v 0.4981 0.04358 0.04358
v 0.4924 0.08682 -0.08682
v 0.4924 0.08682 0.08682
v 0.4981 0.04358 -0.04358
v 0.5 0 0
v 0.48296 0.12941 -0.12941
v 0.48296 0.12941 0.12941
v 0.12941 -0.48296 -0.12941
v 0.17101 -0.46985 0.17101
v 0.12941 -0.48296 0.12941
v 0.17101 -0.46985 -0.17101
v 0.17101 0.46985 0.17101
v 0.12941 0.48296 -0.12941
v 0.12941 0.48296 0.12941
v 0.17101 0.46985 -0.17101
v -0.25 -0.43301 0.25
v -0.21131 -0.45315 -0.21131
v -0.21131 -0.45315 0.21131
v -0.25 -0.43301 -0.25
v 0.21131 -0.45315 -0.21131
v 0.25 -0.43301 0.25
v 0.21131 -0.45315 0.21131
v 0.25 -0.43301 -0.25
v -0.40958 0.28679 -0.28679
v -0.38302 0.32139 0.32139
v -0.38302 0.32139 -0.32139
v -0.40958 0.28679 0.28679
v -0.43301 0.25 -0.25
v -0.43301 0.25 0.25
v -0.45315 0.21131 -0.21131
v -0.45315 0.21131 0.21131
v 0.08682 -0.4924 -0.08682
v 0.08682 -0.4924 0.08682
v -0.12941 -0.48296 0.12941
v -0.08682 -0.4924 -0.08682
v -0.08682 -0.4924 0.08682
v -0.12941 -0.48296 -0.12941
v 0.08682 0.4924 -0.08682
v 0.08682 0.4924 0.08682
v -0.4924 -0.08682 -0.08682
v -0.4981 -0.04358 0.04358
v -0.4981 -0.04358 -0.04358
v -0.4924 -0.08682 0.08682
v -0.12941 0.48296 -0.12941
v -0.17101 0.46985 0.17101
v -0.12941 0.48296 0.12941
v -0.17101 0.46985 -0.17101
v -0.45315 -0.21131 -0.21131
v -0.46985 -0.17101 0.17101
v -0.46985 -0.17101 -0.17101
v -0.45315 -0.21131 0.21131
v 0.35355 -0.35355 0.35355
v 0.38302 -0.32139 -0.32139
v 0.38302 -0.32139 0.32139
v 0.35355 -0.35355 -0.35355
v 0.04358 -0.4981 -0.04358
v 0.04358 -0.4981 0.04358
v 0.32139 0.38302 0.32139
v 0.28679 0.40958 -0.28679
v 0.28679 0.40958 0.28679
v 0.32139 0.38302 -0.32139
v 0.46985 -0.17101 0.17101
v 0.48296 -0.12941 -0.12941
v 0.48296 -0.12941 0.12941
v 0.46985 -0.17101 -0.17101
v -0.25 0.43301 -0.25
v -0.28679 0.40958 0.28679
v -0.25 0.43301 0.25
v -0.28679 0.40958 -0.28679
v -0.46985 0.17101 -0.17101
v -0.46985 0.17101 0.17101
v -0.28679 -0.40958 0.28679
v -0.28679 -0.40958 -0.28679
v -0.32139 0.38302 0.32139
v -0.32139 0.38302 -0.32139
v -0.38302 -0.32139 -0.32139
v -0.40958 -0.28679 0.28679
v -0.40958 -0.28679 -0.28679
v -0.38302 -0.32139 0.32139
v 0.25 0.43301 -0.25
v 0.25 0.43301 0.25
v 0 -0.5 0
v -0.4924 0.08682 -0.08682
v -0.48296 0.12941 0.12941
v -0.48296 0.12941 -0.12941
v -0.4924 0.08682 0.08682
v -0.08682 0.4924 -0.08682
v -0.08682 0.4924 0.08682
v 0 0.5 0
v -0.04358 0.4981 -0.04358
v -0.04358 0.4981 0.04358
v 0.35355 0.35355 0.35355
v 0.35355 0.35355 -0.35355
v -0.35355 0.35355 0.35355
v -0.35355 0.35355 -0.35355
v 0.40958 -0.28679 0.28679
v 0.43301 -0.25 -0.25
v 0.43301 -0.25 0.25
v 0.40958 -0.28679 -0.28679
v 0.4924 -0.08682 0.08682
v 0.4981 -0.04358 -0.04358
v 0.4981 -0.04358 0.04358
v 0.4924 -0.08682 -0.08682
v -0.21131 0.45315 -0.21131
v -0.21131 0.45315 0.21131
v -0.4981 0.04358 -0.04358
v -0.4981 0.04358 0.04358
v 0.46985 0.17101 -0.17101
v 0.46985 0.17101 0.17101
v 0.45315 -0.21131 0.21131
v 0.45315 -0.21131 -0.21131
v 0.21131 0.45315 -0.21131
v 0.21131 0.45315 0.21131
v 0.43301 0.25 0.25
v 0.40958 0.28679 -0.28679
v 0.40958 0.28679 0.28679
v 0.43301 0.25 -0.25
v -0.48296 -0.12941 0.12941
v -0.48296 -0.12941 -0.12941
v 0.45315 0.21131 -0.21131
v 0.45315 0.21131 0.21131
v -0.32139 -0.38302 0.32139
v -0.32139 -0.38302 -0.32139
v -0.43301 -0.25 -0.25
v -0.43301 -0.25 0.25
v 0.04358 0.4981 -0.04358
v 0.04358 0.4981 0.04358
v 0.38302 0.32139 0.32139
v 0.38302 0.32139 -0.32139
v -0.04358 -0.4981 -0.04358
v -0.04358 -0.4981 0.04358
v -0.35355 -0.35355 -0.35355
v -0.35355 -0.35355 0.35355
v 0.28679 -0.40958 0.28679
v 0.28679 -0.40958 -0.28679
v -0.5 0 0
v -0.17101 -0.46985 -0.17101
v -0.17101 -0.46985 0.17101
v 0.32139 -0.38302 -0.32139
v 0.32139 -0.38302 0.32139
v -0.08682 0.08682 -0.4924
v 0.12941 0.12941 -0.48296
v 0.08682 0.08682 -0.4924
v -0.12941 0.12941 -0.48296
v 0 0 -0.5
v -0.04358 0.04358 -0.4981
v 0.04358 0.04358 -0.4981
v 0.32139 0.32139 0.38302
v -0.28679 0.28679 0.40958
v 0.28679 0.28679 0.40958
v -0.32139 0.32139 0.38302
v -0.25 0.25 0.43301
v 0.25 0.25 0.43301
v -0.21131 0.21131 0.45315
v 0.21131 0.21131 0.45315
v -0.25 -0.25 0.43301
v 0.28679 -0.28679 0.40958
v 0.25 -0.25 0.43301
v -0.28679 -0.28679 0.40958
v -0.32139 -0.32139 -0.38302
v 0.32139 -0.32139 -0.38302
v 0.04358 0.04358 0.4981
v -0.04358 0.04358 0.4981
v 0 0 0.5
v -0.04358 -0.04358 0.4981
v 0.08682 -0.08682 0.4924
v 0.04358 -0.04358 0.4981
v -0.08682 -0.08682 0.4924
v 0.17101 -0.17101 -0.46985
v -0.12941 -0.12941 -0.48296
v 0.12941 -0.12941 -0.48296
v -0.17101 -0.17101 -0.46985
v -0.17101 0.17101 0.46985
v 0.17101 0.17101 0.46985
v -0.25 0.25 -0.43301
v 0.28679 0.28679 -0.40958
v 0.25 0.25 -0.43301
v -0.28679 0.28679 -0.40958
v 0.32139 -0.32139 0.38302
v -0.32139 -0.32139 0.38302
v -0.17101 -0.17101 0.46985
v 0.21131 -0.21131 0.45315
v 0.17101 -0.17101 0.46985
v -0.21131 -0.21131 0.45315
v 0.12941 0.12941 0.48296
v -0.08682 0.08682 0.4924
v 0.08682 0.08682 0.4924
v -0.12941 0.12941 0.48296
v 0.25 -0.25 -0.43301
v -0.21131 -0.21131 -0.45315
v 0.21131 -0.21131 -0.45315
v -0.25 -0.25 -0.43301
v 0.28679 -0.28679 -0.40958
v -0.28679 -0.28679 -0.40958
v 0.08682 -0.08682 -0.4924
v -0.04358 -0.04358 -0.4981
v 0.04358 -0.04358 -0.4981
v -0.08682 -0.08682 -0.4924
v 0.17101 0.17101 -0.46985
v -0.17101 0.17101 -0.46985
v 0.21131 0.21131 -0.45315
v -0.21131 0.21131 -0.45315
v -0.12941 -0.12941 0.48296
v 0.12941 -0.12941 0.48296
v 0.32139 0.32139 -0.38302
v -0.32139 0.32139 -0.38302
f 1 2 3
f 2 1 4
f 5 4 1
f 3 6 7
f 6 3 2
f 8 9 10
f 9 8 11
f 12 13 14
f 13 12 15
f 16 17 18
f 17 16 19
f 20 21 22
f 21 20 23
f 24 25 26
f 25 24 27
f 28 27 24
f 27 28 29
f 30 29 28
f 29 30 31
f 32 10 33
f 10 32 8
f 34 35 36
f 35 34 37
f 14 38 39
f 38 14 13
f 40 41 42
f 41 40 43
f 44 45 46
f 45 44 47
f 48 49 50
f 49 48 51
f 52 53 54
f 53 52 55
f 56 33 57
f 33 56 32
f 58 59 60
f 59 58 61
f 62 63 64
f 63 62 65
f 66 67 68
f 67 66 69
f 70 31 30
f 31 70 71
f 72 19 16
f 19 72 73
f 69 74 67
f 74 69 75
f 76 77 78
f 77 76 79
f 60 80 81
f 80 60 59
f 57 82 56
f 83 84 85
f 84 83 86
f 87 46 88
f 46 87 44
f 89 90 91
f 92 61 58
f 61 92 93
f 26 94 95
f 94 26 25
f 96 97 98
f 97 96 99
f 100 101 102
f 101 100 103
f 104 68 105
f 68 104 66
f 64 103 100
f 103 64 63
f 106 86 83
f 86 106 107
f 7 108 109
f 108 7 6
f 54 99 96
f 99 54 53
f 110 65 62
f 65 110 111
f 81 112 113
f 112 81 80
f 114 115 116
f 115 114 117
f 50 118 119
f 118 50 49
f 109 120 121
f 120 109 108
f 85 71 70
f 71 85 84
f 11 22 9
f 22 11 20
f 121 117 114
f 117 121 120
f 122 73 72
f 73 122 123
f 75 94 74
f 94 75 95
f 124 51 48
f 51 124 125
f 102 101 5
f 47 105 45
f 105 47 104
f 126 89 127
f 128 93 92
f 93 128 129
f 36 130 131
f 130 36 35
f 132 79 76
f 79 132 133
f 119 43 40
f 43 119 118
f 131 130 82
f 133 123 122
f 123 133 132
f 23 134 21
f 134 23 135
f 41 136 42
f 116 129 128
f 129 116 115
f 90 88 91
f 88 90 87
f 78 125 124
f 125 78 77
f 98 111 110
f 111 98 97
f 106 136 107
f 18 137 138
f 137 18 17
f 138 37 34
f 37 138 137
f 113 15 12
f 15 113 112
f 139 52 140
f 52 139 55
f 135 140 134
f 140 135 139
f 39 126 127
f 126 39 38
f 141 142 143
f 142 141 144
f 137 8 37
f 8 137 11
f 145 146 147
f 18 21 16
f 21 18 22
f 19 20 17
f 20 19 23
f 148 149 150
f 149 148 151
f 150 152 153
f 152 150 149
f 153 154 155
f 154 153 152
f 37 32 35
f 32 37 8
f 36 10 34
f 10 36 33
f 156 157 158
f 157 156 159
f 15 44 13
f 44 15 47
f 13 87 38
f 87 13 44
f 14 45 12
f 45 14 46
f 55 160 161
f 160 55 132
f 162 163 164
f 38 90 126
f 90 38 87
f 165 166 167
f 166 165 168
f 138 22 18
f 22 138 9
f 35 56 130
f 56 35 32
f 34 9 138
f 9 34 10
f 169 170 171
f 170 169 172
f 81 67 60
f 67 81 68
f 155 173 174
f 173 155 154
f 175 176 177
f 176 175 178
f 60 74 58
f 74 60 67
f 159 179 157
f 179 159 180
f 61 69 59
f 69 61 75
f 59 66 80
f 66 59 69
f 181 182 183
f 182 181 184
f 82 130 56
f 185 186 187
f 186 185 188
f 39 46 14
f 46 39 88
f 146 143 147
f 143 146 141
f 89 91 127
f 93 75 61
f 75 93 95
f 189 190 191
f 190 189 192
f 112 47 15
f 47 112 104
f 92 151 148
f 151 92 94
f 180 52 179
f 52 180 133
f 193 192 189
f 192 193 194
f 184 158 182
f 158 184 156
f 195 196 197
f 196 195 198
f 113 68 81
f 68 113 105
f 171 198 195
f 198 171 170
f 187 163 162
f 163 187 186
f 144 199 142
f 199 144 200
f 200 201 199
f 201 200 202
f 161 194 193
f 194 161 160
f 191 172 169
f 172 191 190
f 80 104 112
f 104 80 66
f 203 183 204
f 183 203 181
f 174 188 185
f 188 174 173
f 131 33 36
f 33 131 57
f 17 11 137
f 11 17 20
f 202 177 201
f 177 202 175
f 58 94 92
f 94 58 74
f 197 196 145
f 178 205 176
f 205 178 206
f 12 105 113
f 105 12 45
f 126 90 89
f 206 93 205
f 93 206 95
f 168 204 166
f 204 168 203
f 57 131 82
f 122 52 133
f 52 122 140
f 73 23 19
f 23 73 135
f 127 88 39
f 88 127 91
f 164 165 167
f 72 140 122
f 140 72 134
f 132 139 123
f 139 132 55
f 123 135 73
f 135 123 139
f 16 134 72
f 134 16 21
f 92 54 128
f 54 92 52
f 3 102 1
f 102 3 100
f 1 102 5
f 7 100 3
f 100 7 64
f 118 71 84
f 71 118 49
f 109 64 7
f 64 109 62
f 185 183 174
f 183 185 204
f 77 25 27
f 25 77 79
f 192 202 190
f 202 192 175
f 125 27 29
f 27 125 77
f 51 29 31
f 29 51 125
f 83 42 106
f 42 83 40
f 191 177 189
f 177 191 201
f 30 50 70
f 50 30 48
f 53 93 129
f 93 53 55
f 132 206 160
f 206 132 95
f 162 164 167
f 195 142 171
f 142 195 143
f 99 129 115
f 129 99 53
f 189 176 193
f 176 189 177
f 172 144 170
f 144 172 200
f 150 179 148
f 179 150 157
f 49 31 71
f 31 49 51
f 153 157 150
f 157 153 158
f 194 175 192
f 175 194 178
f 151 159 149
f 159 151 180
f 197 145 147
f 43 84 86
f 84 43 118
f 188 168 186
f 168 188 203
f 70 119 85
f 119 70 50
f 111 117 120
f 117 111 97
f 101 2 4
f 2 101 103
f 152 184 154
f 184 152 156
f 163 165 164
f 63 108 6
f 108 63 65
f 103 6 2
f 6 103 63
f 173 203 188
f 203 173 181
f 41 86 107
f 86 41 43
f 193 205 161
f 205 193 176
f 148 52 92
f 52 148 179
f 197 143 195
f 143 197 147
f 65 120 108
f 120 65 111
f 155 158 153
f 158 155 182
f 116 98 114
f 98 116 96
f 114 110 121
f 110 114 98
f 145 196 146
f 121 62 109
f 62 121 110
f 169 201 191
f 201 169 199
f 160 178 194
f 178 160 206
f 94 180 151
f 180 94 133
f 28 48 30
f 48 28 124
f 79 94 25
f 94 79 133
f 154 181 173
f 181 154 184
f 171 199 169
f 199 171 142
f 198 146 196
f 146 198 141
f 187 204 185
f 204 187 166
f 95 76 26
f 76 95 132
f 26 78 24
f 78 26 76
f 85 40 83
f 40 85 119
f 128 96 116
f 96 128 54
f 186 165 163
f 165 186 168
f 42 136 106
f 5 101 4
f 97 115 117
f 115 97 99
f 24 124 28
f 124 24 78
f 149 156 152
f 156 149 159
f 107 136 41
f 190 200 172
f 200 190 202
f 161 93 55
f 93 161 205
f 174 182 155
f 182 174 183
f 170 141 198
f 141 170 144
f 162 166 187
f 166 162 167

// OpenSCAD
// CSG.scad - Basic example of CSG usage



intersection() {
    cylinder(2,0.5,0.5, center=true, $fn=72);
    rotate([0,90,0]) {
        cylinder(2,0.5,0.5, center=true, $fn=72);
    }
    rotate([90,0,0]) {
        cylinder(2,0.5,0.5, center=true, $fn=72);
    }

}
